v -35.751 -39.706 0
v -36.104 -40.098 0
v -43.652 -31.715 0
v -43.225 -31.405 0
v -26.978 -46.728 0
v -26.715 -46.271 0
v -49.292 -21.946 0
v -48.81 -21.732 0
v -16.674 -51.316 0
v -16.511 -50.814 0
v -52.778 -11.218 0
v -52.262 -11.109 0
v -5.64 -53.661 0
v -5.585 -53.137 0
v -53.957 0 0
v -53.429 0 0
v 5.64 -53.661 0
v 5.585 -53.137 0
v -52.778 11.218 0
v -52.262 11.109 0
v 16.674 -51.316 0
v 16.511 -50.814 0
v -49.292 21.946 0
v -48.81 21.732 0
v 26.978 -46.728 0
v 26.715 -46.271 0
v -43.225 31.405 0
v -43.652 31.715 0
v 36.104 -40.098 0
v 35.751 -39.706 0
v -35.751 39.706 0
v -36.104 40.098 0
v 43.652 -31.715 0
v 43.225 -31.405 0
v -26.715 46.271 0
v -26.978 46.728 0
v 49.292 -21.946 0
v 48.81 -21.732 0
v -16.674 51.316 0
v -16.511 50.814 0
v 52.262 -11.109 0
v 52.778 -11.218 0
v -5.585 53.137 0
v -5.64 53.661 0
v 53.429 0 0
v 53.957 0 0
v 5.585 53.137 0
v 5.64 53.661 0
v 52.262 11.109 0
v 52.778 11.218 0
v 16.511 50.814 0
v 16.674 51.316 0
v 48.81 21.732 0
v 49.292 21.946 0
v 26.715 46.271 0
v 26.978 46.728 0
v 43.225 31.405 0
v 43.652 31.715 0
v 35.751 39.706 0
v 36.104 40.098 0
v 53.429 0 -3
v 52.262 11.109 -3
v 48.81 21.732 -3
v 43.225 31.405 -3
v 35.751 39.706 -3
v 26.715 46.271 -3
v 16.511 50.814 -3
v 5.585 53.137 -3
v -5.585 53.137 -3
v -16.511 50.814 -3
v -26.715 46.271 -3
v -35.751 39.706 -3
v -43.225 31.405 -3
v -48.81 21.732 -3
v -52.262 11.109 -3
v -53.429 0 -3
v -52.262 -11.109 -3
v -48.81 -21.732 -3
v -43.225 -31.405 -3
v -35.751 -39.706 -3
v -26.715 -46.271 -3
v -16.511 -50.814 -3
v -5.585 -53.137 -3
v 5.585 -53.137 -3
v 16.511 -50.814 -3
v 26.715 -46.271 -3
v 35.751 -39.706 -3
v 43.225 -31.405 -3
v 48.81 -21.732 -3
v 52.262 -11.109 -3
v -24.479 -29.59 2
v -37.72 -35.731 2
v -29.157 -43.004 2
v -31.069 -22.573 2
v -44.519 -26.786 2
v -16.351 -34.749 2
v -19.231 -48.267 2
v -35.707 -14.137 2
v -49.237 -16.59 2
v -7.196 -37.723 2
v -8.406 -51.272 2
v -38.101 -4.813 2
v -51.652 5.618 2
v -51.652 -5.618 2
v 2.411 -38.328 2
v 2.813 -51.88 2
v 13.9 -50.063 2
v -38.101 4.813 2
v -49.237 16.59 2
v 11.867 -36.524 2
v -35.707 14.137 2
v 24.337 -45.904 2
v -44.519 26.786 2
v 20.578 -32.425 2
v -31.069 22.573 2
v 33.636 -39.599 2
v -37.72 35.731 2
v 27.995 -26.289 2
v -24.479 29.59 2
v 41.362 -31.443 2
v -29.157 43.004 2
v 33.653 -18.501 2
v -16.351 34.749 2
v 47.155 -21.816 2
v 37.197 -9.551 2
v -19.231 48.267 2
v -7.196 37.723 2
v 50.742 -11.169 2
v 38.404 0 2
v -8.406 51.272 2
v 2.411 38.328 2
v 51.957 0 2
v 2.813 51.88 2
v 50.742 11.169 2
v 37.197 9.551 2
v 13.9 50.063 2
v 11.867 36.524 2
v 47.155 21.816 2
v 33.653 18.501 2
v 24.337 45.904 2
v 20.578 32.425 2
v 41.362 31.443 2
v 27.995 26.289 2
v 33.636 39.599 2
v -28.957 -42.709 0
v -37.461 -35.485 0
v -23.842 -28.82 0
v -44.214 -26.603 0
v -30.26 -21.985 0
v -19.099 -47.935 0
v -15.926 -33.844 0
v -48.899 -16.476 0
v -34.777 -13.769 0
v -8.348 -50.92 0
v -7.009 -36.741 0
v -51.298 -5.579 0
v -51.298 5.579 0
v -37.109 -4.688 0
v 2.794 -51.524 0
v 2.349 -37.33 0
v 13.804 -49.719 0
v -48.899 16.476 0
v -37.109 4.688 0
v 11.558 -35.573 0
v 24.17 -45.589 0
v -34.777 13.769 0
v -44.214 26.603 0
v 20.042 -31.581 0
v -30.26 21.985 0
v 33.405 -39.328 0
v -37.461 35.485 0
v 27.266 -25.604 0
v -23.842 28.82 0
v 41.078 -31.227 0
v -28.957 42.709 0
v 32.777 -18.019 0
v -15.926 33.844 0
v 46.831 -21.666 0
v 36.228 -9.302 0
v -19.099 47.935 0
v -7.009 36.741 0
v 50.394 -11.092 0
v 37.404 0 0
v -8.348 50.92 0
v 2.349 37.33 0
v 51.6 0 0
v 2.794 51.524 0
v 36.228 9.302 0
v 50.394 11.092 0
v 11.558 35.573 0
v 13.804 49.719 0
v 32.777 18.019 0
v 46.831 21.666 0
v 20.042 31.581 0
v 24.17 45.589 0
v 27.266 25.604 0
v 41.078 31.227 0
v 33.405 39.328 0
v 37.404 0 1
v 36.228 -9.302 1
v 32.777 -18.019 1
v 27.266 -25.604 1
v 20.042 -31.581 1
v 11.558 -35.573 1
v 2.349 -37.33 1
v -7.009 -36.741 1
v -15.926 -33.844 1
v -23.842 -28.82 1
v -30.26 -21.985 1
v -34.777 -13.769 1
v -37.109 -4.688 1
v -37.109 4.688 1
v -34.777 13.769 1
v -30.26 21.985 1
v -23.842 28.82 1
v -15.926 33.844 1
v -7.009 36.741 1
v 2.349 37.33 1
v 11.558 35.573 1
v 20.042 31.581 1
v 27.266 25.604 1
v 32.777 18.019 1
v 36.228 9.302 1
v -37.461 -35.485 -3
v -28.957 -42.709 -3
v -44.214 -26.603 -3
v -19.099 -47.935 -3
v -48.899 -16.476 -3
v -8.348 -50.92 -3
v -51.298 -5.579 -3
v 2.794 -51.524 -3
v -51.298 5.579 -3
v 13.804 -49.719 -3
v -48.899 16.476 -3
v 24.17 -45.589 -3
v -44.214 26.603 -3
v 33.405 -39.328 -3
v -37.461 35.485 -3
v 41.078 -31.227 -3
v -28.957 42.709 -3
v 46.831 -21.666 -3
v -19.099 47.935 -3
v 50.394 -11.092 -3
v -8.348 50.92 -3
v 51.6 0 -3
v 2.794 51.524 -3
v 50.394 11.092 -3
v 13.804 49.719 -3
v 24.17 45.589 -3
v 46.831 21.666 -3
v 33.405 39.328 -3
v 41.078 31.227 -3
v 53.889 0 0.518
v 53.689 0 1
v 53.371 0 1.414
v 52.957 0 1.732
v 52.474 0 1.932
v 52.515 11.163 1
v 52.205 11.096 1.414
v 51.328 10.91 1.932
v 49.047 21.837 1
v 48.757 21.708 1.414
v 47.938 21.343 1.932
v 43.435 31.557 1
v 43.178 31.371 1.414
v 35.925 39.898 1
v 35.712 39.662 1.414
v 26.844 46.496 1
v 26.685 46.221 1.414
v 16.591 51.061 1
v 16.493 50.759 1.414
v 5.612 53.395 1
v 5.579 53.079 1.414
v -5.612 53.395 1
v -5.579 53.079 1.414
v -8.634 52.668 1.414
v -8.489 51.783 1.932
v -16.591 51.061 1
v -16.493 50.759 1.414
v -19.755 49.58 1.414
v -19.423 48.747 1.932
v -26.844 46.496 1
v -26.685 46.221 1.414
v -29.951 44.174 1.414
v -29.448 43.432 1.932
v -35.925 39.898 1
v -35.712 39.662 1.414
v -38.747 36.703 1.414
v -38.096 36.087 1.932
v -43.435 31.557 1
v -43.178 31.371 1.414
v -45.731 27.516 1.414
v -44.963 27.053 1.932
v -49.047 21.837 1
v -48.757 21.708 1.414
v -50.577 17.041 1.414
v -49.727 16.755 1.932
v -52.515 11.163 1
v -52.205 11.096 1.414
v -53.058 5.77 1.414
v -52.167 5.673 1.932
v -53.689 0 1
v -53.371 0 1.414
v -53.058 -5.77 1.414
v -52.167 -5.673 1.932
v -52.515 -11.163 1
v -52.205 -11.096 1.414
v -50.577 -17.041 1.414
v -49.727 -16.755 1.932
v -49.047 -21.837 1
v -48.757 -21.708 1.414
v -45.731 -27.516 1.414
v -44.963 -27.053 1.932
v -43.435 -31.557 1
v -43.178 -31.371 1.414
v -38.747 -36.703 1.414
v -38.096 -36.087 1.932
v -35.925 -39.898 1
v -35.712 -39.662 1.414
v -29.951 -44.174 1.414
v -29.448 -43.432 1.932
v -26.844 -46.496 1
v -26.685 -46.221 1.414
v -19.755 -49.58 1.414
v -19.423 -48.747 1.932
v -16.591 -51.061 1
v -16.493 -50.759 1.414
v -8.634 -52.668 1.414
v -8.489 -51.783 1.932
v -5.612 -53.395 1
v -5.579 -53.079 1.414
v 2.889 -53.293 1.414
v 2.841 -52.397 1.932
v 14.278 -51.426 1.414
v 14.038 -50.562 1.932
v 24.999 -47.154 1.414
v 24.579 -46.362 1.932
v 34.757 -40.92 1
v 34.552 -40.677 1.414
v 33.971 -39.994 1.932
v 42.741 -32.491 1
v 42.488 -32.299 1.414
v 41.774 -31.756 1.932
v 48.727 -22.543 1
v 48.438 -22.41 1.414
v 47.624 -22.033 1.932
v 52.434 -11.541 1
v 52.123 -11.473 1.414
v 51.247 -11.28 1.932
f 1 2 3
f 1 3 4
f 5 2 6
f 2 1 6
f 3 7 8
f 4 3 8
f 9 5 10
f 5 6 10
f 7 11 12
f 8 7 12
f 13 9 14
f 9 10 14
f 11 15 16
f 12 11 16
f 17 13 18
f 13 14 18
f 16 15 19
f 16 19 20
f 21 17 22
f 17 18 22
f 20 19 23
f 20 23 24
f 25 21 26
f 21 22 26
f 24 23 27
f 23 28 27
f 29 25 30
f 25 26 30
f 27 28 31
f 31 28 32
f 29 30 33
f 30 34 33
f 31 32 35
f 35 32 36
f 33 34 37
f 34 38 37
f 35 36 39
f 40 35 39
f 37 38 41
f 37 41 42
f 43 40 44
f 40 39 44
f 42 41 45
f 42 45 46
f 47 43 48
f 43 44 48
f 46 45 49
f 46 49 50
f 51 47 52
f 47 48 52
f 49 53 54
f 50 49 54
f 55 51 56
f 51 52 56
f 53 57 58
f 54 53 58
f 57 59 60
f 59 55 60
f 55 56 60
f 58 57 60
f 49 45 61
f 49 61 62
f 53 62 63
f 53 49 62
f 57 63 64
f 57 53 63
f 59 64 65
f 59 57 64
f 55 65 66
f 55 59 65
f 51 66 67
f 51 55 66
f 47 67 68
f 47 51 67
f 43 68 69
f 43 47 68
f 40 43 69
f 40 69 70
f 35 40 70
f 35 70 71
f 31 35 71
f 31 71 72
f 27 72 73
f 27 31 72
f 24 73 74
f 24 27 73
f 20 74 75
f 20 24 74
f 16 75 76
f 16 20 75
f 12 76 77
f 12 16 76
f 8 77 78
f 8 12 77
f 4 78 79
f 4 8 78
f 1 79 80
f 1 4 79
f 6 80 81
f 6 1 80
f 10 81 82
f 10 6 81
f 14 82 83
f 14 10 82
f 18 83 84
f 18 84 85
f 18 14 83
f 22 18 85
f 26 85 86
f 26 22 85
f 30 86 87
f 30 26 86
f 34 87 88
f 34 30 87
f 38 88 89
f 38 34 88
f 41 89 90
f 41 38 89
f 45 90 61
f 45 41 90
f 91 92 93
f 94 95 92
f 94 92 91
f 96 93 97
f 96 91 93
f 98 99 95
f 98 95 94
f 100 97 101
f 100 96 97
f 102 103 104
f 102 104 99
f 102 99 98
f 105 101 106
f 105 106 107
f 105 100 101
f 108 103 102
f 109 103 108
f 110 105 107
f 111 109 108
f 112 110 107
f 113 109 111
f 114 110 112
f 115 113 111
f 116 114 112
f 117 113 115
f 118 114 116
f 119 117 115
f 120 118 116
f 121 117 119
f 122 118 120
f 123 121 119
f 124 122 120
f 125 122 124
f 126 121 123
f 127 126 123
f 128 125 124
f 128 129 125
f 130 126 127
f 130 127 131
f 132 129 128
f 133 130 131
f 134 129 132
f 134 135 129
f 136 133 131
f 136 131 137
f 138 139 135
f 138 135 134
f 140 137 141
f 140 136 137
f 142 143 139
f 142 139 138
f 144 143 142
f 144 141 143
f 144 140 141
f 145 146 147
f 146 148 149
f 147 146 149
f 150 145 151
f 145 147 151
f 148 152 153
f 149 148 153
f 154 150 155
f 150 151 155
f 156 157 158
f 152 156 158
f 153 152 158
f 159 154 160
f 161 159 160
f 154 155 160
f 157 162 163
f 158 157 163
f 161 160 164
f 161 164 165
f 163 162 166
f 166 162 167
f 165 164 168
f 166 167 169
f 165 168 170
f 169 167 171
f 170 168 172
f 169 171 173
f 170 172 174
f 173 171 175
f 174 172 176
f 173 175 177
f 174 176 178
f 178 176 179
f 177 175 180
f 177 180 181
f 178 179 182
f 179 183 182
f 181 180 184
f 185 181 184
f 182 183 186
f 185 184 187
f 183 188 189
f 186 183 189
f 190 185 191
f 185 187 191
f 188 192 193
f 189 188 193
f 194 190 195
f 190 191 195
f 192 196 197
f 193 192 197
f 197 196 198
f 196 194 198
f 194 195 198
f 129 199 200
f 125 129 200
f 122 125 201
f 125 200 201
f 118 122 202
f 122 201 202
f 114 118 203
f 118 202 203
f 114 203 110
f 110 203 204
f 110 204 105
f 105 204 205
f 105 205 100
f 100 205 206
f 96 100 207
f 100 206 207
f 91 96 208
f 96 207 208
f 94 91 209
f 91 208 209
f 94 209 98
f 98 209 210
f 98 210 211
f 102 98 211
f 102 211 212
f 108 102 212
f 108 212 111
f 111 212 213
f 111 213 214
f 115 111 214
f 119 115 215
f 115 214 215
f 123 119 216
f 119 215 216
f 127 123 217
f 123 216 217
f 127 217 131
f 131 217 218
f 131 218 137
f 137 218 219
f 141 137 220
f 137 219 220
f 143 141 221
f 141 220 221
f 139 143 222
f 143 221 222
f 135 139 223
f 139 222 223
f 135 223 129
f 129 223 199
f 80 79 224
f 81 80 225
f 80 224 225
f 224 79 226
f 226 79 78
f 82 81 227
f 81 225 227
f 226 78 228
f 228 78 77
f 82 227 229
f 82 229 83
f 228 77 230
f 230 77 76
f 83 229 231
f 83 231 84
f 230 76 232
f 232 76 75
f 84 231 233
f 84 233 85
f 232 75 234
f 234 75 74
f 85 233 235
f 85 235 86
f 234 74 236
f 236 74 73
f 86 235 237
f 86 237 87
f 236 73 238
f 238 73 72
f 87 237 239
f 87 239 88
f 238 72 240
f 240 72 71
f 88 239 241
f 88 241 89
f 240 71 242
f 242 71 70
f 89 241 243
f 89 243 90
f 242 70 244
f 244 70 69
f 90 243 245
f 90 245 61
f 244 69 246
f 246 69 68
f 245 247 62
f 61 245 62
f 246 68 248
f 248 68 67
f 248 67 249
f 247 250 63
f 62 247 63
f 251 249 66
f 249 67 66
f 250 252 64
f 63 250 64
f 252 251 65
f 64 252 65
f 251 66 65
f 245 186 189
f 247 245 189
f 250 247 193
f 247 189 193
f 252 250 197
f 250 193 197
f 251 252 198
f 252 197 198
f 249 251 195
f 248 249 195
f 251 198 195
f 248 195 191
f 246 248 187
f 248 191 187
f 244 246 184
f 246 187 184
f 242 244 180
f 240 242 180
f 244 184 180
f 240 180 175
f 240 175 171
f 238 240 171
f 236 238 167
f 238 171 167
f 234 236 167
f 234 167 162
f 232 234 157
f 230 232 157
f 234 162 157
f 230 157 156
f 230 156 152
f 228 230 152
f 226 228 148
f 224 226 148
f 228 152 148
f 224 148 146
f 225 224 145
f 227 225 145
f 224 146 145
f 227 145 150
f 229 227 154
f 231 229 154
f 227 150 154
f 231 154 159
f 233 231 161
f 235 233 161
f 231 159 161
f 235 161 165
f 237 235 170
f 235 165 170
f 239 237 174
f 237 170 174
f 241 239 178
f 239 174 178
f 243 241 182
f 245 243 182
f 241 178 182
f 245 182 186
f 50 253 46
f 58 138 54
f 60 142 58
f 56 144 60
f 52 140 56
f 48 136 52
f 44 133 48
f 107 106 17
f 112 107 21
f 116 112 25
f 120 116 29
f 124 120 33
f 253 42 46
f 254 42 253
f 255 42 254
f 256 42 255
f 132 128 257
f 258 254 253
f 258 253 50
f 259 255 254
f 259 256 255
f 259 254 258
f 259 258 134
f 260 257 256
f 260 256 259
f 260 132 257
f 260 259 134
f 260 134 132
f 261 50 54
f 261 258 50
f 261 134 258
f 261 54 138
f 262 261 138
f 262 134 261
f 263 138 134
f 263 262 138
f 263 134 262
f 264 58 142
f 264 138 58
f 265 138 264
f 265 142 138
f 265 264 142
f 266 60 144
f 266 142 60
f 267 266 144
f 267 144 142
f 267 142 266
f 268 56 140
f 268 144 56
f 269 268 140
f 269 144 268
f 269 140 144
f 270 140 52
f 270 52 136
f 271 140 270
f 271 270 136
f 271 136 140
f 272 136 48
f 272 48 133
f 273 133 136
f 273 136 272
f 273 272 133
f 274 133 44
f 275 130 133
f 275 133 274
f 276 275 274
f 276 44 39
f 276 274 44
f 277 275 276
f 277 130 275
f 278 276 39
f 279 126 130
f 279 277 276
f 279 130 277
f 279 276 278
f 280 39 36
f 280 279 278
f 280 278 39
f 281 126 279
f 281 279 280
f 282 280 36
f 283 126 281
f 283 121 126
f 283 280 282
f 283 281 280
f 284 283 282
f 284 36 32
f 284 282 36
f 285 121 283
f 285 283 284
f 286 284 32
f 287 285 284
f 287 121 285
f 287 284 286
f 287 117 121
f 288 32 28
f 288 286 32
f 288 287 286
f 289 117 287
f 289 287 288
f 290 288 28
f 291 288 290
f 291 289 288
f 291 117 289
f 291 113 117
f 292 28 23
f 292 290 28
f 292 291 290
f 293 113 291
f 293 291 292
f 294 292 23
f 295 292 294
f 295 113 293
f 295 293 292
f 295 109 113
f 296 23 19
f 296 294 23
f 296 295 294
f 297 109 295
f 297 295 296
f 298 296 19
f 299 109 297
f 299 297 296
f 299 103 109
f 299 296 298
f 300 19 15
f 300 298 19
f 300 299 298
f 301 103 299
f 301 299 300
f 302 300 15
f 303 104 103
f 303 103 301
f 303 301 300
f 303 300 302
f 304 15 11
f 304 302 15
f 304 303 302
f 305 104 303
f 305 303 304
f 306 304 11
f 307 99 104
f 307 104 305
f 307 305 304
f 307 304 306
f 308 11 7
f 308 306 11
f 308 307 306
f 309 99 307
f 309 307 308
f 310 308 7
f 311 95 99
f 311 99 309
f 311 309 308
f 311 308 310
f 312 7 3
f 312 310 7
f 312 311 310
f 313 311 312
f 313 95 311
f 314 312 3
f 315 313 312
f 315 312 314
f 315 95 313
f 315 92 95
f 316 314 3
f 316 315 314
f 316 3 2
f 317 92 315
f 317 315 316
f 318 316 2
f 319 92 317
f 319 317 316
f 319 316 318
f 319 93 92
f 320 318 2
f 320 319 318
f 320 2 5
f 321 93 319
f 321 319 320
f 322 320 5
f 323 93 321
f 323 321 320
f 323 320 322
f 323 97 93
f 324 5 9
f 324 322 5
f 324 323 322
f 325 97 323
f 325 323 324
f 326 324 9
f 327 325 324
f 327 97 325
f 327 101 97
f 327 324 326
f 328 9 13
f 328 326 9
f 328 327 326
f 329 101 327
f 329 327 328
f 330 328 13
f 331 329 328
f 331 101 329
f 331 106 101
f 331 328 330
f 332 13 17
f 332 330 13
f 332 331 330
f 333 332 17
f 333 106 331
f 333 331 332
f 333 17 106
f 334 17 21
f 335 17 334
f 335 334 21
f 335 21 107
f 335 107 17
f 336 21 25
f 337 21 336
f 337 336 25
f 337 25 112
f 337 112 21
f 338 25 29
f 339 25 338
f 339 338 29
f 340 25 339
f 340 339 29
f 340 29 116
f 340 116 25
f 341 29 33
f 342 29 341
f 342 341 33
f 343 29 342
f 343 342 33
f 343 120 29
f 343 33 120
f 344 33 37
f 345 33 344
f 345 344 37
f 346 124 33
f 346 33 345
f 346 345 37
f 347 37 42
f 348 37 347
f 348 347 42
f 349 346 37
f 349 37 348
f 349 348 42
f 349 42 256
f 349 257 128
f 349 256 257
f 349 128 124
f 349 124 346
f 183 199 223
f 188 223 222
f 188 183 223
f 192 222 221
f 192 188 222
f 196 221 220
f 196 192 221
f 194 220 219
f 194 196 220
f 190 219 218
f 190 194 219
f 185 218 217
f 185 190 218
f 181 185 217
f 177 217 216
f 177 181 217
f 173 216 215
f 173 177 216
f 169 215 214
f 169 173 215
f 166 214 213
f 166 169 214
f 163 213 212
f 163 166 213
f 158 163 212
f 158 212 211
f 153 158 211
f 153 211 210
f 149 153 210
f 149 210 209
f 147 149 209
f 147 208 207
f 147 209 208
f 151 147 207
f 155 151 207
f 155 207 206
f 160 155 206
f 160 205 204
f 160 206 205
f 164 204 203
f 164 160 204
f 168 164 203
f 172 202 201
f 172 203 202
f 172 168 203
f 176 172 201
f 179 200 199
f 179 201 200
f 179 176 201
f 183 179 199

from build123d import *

# Parameters (mm, degrees)
F0_R     = 53.4294983316
F0_R_2   = 51.6
F1_DEPTH = 3
F3_R     = 53.9566734819
F4_DEPTH = 2
F5_R     = 1.99999
F6_R     = 37.4035262833
F7_DEPTH = 3
F8_SIZE2 = 1
F8_SIZE  = 1


# Not quite as in the source:
# - a fillet or chamfer is up to 0.001 mm smaller than in the source, because OpenCascade refuses the exact size


with BuildPart() as f1:
    # F0 (on Top) → F1 (new body)
    with BuildSketch(Plane.XY):
        Circle(F0_R)
        Circle(F0_R_2, mode=Mode.SUBTRACT)
    extrude(amount=-F1_DEPTH)

    # F3 (on offset) → F4 (join)
    with BuildSketch(Plane.XY):
        Circle(F3_R)
    extrude(amount=F4_DEPTH)

    # F5 (radius 2 in the source; OpenCascade refuses exactly that, so slightly less here)
    f5_edges = [f1.edges().sort_by_distance(p)[0] for p in [
        (-53.956673, 0, 2),
    ]]
    fillet(f5_edges, radius=F5_R)

    # F6 (on offset) → F7 (cut)
    with BuildSketch(Plane.XY):
        Circle(F6_R)
    extrude(amount=F7_DEPTH, mode=Mode.SUBTRACT)

    # F8
    f8_edges = [f1.edges().sort_by_distance(p)[0] for p in [
        (-37.403526, 0, 2),
    ]]
    chamfer(f8_edges, length=F8_SIZE, length2=F8_SIZE2)


solid = f1.part
